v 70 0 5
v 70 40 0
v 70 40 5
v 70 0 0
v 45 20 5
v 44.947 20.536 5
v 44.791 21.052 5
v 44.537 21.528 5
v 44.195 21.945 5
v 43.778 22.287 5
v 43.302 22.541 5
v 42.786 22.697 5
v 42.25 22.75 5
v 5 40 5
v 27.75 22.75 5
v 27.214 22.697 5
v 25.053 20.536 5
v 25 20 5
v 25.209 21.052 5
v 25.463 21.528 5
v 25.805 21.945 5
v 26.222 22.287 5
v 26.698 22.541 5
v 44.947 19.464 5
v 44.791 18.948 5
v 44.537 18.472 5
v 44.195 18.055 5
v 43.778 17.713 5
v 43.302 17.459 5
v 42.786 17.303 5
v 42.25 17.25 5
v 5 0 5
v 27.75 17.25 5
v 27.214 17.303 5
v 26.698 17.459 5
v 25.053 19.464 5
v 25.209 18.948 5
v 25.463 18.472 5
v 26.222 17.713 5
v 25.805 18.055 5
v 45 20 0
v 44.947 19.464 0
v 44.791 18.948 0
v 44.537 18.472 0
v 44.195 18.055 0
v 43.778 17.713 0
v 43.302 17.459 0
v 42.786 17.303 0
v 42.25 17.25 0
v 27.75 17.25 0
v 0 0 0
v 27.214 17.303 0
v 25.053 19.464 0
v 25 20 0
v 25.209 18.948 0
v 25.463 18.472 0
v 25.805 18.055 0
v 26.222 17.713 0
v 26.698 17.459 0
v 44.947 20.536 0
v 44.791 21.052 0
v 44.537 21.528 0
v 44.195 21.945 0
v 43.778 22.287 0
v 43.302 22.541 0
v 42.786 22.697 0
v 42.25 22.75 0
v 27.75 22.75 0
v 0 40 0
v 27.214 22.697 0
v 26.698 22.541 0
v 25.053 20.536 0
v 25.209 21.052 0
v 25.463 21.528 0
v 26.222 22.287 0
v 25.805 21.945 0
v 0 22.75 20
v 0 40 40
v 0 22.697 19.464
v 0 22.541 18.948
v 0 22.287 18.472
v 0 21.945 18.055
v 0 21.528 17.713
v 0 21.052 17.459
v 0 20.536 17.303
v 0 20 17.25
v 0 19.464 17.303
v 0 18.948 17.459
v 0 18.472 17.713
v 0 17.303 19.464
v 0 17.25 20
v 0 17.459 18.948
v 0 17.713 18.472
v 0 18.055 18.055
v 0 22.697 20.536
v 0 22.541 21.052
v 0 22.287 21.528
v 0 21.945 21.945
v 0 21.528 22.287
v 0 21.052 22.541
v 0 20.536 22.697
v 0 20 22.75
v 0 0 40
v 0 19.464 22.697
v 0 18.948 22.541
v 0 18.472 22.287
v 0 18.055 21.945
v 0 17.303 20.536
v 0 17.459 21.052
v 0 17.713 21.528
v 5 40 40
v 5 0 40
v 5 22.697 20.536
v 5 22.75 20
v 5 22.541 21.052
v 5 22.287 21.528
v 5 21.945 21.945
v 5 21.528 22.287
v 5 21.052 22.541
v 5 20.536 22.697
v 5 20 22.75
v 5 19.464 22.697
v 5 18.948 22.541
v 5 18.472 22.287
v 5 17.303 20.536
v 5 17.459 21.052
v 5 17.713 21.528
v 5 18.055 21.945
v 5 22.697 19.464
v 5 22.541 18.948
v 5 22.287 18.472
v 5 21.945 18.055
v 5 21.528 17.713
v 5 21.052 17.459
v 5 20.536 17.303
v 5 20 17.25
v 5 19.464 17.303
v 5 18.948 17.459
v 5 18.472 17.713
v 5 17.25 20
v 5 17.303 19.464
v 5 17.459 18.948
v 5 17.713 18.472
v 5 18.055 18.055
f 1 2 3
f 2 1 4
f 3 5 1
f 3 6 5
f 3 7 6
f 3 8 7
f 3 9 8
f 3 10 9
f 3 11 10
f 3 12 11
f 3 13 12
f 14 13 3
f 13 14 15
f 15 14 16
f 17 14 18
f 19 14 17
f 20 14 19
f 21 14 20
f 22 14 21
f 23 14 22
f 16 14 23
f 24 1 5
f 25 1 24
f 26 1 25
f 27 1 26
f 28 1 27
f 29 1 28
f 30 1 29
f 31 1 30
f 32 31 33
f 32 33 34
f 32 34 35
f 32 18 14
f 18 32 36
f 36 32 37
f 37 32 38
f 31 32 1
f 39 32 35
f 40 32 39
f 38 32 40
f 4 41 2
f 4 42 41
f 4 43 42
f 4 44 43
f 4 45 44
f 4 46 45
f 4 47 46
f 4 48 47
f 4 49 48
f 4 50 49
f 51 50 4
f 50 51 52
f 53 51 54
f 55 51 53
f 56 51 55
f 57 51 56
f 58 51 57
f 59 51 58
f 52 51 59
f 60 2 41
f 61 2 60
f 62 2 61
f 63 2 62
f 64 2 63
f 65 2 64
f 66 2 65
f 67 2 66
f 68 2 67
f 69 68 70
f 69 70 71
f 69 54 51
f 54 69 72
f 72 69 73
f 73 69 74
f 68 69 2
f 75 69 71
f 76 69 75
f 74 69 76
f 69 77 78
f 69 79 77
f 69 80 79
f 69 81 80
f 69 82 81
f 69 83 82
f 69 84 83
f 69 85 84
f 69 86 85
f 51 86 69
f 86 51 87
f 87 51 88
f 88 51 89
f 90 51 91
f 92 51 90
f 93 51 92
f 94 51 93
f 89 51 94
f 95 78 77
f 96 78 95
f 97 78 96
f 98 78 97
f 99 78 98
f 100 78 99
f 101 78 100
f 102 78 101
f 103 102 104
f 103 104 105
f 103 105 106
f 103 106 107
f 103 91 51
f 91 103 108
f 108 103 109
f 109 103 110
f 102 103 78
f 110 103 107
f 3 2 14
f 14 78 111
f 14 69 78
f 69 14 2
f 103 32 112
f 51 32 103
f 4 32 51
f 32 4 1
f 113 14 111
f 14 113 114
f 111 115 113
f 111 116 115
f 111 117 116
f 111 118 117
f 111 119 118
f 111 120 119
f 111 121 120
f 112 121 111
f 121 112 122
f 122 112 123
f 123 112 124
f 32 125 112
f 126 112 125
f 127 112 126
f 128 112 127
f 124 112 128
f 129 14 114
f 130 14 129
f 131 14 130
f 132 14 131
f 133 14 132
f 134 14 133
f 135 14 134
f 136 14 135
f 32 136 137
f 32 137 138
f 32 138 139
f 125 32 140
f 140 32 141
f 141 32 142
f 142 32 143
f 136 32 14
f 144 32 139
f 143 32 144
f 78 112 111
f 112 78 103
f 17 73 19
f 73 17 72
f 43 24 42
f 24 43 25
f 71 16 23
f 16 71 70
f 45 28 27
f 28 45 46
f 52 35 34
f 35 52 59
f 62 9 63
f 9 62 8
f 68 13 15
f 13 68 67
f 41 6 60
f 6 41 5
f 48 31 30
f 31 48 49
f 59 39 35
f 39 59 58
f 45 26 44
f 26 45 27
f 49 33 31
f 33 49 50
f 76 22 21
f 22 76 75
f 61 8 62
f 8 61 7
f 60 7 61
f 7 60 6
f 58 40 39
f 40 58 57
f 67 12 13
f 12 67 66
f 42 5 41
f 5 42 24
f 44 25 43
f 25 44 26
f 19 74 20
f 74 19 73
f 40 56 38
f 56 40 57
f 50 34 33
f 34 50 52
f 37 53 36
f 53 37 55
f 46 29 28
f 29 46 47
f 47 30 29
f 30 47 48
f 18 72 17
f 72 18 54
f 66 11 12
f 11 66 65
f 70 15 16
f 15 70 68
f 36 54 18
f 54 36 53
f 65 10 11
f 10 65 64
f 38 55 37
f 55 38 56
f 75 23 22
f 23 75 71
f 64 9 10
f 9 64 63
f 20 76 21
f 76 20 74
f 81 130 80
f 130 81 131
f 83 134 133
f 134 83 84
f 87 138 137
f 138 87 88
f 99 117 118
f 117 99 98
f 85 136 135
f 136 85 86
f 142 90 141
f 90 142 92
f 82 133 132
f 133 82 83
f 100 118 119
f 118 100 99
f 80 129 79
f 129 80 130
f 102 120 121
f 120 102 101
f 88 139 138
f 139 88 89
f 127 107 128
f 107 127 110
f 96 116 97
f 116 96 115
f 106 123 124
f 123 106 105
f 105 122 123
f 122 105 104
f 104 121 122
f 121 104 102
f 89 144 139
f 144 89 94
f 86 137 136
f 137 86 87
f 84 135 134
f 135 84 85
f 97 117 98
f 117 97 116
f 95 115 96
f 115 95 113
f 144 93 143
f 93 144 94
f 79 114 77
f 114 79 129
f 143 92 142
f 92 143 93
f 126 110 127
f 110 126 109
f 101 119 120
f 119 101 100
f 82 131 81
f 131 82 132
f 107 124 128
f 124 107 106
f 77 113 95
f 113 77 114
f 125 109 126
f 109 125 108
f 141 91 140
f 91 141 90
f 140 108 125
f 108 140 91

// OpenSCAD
$fn = 32;

// ----------------------------------------------------------------------
// L-bracket: 70 x 40 x 40 mm
// ----------------------------------------------------------------------

// --- parameters (mm) ---
run_out = 70;             // horizontal leg, X
rise = 40;                // vertical leg, Z
bracket_w = 40;           // bracket depth, Y
sheet_t = 5;              // plate thickness
hole_d = 5.5;             // clearance for M5
slot_l = 20;              // adjustment slot length

module hole_z(px, py) {
  translate([px, py, -2.5]) cylinder(h = sheet_t + 5, d = hole_d);
}
module hole_x(pz, py) {
  translate([-2.5, py, pz]) rotate([0, 90, 0]) cylinder(h = sheet_t + 5, d = hole_d);
}
module adjust_slot(px, py) {
  hull() {
    translate([px - (slot_l - hole_d) / 2, py, -2.5]) cylinder(h = sheet_t + 5, d = hole_d);
    translate([px + (slot_l - hole_d) / 2, py, -2.5]) cylinder(h = sheet_t + 5, d = hole_d);
  }
}

difference() {
  union() {
    /* horizontal leg */
    cube([run_out, bracket_w, sheet_t]);
    /* vertical leg, overlapping the corner block */
    cube([sheet_t, bracket_w, rise]);
  }
  adjust_slot(35, 20);
  hole_x(20, 20);
}
